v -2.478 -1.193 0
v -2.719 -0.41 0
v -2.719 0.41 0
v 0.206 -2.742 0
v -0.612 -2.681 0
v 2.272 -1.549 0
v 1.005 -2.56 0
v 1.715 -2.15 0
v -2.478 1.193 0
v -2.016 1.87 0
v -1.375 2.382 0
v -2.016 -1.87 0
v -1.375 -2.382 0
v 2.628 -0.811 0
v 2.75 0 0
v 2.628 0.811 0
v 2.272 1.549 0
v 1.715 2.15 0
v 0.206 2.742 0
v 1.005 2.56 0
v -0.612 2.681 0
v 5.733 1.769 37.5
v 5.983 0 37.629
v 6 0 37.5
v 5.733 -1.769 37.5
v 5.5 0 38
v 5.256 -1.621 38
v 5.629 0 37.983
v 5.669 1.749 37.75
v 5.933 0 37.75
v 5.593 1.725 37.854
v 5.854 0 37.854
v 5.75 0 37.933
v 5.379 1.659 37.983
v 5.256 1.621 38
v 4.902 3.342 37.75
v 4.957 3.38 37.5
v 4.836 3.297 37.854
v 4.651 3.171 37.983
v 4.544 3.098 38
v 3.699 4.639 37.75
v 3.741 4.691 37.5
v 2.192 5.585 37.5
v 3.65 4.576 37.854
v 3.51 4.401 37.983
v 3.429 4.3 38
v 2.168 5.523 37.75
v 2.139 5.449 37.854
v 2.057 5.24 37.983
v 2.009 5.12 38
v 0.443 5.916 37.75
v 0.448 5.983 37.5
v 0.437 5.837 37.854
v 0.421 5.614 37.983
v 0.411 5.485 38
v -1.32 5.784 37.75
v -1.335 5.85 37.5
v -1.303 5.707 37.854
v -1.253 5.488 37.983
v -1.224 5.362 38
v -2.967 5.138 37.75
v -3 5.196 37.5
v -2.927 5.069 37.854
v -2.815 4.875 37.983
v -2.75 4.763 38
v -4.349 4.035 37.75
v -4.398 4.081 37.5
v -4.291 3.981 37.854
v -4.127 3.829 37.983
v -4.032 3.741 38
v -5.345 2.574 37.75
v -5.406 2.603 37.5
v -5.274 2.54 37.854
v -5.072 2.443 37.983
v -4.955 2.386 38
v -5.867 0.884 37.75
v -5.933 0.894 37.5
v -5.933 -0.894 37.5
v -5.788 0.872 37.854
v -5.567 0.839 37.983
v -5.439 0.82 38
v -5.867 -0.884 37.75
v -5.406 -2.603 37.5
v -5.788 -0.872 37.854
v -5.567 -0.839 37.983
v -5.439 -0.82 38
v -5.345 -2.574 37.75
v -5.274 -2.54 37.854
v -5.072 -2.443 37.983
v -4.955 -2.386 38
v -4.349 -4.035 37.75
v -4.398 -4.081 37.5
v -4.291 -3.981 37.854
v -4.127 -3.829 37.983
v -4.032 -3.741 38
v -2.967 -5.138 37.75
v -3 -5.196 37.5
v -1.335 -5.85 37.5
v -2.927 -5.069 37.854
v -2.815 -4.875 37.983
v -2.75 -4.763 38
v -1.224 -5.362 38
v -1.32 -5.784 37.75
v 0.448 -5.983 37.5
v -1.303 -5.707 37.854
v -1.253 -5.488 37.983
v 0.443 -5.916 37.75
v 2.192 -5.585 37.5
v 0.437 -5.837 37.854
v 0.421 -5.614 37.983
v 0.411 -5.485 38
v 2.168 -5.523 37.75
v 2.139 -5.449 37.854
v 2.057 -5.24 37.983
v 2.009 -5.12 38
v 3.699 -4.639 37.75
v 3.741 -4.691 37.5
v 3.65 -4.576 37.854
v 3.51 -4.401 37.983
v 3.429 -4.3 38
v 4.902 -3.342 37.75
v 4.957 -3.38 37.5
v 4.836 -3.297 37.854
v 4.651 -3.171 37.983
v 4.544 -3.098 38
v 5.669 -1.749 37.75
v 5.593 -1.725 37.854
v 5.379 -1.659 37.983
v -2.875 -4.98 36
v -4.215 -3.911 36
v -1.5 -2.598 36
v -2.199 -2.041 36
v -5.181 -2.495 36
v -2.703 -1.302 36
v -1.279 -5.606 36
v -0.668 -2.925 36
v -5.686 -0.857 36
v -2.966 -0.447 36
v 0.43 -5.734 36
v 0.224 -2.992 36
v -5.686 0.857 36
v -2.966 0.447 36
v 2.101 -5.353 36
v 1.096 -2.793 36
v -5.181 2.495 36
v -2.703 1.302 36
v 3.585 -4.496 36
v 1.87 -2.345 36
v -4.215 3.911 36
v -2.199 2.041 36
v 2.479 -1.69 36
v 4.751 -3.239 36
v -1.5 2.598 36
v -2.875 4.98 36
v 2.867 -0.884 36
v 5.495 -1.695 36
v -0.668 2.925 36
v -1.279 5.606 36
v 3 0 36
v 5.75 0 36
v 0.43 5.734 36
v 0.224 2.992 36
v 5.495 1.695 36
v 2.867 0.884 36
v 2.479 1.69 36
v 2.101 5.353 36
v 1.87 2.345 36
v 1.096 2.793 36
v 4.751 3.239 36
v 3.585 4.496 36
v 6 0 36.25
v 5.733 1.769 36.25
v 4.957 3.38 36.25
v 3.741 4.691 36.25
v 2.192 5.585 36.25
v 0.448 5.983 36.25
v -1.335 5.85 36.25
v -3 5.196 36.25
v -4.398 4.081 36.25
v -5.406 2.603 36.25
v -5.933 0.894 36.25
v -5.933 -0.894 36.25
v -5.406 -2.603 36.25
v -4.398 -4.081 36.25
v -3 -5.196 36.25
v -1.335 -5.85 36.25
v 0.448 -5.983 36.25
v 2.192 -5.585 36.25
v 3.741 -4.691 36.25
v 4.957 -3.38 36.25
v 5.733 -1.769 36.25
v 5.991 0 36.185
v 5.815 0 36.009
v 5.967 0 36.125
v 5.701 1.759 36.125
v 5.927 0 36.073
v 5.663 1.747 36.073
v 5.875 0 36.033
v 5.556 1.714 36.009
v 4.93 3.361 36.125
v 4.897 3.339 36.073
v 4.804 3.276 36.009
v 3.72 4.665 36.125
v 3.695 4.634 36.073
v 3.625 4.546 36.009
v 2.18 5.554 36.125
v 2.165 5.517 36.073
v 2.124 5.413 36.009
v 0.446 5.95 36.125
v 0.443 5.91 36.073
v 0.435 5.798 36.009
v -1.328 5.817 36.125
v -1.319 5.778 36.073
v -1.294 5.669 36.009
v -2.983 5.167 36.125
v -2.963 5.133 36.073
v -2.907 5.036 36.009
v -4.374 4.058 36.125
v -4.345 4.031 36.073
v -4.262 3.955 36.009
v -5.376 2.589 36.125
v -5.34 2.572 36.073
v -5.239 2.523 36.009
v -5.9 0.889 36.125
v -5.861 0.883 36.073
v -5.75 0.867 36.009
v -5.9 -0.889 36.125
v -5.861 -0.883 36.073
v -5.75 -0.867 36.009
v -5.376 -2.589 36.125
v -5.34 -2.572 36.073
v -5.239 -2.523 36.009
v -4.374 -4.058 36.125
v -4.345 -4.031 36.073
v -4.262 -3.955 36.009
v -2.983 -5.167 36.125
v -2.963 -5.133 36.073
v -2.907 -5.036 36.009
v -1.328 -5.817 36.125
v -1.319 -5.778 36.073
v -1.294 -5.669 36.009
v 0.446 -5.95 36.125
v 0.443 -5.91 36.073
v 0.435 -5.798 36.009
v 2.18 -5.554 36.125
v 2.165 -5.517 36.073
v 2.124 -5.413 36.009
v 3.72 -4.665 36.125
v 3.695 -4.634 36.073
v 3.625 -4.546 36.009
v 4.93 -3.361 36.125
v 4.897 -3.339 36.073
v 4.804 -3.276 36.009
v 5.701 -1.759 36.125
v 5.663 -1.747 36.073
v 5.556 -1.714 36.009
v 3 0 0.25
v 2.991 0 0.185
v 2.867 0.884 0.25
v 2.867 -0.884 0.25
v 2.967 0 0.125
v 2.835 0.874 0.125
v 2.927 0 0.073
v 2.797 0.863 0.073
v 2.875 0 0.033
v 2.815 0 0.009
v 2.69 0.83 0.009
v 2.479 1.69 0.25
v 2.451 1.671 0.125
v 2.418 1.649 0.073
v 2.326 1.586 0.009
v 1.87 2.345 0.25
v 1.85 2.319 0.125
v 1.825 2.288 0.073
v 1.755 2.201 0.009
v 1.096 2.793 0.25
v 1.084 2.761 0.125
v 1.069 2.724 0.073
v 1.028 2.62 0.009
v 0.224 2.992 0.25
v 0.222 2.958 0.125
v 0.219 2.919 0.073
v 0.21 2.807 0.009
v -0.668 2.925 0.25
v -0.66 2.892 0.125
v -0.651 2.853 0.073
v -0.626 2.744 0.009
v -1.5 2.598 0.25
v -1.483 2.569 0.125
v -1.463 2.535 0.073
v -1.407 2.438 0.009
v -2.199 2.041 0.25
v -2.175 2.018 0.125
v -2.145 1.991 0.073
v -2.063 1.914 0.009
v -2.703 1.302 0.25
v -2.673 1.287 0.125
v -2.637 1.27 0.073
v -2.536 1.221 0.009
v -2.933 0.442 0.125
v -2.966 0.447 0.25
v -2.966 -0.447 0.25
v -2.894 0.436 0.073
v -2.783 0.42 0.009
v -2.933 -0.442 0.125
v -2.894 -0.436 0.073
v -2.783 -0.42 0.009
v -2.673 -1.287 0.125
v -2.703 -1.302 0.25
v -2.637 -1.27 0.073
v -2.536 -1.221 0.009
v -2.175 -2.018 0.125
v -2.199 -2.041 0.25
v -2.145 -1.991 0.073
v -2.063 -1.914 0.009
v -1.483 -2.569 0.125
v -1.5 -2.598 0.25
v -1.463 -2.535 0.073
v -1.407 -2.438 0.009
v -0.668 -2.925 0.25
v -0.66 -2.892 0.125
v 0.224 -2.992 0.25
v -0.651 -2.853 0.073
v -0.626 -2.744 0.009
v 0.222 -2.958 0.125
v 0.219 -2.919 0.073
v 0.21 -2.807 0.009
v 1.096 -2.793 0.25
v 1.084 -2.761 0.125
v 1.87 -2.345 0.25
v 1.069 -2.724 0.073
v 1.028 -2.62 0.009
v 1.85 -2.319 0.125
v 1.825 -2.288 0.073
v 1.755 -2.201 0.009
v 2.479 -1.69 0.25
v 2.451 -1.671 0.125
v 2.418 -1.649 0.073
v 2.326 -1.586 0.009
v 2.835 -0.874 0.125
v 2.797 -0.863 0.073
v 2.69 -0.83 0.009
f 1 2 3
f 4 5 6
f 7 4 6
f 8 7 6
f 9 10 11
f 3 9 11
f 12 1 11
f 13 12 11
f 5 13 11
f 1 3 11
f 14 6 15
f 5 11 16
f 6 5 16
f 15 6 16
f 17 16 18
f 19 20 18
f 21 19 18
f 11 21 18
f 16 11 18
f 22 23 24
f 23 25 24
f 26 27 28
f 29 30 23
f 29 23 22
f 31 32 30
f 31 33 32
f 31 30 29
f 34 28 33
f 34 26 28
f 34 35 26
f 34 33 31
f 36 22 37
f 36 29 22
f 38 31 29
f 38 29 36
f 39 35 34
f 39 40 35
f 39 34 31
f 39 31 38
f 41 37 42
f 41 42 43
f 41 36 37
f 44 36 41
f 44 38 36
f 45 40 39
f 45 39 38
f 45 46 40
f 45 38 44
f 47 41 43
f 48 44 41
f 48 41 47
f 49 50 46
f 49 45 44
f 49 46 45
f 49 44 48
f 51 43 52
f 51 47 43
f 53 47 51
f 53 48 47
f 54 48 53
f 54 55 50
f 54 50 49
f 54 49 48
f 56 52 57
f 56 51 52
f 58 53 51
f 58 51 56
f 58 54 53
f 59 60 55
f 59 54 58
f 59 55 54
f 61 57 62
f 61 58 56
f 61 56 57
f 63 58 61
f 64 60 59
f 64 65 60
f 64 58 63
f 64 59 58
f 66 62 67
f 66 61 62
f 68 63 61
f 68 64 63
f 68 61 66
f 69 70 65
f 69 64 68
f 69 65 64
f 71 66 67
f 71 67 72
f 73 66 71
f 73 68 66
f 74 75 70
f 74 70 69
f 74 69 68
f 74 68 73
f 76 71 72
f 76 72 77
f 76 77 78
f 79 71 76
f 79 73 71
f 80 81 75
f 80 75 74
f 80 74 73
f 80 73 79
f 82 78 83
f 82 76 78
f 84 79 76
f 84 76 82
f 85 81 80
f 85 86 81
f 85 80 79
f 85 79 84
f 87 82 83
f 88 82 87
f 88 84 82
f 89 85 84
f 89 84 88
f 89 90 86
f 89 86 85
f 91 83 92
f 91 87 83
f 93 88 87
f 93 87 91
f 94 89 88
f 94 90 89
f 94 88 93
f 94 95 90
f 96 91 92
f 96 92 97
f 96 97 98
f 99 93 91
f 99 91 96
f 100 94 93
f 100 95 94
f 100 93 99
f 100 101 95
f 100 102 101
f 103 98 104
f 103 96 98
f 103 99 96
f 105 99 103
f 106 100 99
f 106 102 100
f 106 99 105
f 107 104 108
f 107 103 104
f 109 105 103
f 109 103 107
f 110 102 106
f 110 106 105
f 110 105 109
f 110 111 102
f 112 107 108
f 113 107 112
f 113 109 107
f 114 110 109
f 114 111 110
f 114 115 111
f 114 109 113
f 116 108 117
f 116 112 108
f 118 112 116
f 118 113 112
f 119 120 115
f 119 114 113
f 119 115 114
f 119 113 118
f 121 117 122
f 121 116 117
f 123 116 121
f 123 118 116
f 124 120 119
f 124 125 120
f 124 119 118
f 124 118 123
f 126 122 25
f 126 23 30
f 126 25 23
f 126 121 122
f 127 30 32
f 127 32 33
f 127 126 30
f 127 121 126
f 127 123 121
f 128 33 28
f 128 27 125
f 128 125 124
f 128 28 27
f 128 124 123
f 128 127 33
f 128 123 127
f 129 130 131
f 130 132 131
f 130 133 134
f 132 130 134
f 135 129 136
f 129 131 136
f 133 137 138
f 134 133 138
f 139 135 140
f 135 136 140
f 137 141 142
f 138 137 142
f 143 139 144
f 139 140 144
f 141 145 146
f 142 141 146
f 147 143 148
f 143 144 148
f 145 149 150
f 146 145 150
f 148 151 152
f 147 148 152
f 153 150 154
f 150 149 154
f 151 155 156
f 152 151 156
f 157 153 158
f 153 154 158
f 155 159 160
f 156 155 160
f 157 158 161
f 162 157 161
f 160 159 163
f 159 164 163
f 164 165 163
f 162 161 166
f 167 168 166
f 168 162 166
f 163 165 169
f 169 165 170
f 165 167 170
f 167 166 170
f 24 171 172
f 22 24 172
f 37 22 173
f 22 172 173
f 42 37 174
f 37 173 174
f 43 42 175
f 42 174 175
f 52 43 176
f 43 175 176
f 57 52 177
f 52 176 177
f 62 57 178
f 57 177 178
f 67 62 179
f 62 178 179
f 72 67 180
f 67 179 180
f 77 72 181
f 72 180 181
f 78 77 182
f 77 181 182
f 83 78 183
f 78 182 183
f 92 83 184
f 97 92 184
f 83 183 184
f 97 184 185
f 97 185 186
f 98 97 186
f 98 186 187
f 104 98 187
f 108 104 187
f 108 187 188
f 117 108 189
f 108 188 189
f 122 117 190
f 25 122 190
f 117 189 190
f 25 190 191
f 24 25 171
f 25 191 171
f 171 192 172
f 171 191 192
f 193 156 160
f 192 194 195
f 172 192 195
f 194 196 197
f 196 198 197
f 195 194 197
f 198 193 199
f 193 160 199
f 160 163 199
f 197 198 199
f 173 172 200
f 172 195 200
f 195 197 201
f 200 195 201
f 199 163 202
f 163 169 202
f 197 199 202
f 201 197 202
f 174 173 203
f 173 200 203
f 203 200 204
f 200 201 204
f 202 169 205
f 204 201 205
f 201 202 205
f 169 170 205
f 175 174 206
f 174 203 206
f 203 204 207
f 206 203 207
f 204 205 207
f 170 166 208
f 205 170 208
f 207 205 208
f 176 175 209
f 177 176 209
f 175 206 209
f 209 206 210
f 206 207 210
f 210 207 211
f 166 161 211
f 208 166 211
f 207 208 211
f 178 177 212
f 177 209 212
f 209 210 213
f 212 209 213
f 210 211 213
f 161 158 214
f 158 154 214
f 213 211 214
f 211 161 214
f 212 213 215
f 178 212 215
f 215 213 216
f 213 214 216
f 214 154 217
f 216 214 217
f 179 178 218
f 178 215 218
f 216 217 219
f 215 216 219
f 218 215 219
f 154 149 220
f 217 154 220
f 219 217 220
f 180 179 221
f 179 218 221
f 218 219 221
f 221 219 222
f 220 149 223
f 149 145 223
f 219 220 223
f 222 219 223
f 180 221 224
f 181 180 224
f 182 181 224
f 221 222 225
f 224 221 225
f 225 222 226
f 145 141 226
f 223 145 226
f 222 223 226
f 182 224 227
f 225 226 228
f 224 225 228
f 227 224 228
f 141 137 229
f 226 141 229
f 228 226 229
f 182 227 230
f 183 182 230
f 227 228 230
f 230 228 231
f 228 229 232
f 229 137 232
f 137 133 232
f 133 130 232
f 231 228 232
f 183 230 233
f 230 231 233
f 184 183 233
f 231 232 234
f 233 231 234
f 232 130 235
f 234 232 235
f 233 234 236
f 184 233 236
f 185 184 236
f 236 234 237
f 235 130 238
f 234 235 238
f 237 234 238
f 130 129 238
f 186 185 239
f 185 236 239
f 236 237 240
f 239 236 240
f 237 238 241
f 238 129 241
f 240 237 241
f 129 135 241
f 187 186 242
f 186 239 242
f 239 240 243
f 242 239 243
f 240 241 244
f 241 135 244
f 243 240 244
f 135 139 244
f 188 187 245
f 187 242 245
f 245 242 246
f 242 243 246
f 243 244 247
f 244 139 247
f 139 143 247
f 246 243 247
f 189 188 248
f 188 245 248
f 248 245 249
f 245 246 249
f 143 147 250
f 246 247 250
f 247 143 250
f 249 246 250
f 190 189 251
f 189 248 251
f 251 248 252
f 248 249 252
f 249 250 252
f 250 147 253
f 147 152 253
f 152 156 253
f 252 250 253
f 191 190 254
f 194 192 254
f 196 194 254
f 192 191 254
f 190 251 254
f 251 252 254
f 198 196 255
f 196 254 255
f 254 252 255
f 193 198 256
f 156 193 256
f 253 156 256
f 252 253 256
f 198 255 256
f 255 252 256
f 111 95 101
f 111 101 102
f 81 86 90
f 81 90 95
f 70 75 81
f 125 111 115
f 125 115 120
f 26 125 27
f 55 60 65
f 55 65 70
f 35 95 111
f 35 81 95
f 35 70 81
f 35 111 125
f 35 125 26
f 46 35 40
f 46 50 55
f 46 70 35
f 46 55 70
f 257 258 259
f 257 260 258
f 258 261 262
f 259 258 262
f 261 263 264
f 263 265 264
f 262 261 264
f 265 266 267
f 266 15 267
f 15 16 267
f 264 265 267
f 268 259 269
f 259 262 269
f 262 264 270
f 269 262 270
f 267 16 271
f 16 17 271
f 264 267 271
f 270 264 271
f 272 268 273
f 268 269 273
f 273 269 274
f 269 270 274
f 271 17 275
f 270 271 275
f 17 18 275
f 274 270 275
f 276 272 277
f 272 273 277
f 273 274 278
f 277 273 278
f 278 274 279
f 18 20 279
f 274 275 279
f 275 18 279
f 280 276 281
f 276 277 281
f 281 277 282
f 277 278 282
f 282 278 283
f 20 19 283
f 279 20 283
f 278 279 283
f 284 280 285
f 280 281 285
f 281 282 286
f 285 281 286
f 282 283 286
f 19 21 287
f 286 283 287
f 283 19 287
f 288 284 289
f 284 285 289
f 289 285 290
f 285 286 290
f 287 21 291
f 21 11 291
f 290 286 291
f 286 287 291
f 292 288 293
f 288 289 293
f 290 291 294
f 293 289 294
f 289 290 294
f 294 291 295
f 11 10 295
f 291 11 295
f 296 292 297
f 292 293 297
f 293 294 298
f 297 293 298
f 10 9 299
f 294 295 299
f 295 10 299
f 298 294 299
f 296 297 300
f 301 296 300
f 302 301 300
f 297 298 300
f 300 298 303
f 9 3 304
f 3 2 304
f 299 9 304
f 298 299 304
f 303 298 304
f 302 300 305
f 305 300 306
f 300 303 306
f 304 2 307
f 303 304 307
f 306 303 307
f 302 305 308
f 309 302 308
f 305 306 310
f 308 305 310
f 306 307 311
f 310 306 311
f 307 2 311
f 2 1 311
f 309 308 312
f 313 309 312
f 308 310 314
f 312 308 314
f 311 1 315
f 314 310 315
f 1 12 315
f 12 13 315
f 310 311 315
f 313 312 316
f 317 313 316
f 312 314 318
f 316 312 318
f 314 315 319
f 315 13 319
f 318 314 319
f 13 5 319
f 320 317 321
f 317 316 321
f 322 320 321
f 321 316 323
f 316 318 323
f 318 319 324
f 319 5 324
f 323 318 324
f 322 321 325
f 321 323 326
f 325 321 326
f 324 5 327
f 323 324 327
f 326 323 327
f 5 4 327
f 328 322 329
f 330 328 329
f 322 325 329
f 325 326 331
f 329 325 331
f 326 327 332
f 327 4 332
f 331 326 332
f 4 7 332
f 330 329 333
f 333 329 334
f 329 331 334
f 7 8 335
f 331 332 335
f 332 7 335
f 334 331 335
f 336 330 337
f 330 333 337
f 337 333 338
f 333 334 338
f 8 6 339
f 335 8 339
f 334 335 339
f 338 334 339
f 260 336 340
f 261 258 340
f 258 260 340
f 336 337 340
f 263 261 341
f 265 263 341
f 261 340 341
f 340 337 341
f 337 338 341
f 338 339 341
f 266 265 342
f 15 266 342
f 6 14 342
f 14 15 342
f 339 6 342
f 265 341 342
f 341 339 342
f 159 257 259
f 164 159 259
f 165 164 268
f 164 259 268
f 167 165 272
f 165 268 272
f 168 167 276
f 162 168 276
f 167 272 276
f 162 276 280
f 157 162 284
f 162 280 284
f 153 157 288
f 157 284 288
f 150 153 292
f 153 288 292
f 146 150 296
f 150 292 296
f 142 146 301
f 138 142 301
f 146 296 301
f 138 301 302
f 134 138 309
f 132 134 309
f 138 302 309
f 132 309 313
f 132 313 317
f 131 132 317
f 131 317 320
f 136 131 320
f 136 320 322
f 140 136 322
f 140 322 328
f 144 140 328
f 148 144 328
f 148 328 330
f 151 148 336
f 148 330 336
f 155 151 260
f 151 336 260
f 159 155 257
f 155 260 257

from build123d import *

# Parameters (mm, degrees)
F0_R     = 3
F1_DEPTH = 36
F2_R     = 6
F3_DEPTH = 2
F4_R     = 0.5
F5_R     = 0.25


with BuildPart() as f1:
    # F0 (on Top) → F1 (new body)
    with BuildSketch(Plane.XY):
        Circle(F0_R)
    extrude(amount=F1_DEPTH)

    # F2 (on face) → F3 (join)
    with BuildSketch(Plane.XY.offset(36)):
        Circle(F2_R)
    extrude(amount=F3_DEPTH)

    # F4
    f4_edges = [f1.edges().sort_by_distance(p)[0] for p in [
        (-6, 0, 38),
    ]]
    fillet(f4_edges, radius=F4_R)

    # F5
    f5_edges = [f1.edges().sort_by_distance(p)[0] for p in [
        (-6, 0, 36),
        (-3, 0, 0),
    ]]
    fillet(f5_edges, radius=F5_R)


solid = f1.part
